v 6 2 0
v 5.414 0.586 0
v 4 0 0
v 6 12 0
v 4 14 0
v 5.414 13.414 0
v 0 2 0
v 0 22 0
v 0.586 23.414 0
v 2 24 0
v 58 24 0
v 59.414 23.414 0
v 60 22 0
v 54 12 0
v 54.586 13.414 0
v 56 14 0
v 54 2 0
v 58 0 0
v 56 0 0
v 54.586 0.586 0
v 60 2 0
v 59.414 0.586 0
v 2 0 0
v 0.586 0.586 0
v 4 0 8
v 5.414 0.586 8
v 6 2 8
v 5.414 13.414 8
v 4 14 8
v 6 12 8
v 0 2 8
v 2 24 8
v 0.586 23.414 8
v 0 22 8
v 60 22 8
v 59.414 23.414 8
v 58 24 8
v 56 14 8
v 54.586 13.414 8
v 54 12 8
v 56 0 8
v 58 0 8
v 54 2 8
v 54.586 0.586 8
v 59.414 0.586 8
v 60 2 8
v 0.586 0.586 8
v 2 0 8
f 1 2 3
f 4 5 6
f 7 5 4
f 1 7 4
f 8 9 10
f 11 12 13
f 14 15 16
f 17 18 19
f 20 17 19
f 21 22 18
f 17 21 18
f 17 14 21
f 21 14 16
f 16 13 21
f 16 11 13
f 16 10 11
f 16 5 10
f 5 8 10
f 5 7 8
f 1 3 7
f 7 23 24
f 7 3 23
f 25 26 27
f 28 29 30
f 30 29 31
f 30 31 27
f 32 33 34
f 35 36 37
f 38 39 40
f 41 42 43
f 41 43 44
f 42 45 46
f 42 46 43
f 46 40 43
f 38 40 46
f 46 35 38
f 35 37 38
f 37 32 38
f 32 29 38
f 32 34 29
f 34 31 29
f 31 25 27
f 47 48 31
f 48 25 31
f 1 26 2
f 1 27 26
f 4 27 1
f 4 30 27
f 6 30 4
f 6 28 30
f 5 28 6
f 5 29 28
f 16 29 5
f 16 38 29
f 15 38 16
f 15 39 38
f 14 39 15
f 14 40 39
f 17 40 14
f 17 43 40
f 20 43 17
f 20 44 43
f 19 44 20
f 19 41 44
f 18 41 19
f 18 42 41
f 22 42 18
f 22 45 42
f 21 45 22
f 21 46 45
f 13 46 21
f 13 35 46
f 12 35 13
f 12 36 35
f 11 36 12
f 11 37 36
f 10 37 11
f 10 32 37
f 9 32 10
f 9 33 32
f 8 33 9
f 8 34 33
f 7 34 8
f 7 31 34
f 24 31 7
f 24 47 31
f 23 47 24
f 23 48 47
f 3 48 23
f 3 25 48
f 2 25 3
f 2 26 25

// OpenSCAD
$fn = 32;

// ----------------------------------------------------------------------
// Clip blank: staple clip, 8 mm thick
// ----------------------------------------------------------------------

// --- parameters (mm) ---
profile_height = 8;       // extrusion height
profile_points = 24;      // points of the closed outline

profile = [[0, 2], [0.586, 0.586], [2, 0], [4, 0], [5.414, 0.586], [6, 2], [6, 12], [5.414, 13.414], [4, 14], [56, 14], [54.586, 13.414], [54, 12], [54, 2], [54.586, 0.586], [56, 0], [58, 0], [59.414, 0.586], [60, 2], [60, 22], [59.414, 23.414], [58, 24], [2, 24], [0.586, 23.414], [0, 22]];  // single closed polygon, 24 points, counter clockwise

// --- the one profile operation ---
linear_extrude(height = profile_height) polygon(points = profile);
